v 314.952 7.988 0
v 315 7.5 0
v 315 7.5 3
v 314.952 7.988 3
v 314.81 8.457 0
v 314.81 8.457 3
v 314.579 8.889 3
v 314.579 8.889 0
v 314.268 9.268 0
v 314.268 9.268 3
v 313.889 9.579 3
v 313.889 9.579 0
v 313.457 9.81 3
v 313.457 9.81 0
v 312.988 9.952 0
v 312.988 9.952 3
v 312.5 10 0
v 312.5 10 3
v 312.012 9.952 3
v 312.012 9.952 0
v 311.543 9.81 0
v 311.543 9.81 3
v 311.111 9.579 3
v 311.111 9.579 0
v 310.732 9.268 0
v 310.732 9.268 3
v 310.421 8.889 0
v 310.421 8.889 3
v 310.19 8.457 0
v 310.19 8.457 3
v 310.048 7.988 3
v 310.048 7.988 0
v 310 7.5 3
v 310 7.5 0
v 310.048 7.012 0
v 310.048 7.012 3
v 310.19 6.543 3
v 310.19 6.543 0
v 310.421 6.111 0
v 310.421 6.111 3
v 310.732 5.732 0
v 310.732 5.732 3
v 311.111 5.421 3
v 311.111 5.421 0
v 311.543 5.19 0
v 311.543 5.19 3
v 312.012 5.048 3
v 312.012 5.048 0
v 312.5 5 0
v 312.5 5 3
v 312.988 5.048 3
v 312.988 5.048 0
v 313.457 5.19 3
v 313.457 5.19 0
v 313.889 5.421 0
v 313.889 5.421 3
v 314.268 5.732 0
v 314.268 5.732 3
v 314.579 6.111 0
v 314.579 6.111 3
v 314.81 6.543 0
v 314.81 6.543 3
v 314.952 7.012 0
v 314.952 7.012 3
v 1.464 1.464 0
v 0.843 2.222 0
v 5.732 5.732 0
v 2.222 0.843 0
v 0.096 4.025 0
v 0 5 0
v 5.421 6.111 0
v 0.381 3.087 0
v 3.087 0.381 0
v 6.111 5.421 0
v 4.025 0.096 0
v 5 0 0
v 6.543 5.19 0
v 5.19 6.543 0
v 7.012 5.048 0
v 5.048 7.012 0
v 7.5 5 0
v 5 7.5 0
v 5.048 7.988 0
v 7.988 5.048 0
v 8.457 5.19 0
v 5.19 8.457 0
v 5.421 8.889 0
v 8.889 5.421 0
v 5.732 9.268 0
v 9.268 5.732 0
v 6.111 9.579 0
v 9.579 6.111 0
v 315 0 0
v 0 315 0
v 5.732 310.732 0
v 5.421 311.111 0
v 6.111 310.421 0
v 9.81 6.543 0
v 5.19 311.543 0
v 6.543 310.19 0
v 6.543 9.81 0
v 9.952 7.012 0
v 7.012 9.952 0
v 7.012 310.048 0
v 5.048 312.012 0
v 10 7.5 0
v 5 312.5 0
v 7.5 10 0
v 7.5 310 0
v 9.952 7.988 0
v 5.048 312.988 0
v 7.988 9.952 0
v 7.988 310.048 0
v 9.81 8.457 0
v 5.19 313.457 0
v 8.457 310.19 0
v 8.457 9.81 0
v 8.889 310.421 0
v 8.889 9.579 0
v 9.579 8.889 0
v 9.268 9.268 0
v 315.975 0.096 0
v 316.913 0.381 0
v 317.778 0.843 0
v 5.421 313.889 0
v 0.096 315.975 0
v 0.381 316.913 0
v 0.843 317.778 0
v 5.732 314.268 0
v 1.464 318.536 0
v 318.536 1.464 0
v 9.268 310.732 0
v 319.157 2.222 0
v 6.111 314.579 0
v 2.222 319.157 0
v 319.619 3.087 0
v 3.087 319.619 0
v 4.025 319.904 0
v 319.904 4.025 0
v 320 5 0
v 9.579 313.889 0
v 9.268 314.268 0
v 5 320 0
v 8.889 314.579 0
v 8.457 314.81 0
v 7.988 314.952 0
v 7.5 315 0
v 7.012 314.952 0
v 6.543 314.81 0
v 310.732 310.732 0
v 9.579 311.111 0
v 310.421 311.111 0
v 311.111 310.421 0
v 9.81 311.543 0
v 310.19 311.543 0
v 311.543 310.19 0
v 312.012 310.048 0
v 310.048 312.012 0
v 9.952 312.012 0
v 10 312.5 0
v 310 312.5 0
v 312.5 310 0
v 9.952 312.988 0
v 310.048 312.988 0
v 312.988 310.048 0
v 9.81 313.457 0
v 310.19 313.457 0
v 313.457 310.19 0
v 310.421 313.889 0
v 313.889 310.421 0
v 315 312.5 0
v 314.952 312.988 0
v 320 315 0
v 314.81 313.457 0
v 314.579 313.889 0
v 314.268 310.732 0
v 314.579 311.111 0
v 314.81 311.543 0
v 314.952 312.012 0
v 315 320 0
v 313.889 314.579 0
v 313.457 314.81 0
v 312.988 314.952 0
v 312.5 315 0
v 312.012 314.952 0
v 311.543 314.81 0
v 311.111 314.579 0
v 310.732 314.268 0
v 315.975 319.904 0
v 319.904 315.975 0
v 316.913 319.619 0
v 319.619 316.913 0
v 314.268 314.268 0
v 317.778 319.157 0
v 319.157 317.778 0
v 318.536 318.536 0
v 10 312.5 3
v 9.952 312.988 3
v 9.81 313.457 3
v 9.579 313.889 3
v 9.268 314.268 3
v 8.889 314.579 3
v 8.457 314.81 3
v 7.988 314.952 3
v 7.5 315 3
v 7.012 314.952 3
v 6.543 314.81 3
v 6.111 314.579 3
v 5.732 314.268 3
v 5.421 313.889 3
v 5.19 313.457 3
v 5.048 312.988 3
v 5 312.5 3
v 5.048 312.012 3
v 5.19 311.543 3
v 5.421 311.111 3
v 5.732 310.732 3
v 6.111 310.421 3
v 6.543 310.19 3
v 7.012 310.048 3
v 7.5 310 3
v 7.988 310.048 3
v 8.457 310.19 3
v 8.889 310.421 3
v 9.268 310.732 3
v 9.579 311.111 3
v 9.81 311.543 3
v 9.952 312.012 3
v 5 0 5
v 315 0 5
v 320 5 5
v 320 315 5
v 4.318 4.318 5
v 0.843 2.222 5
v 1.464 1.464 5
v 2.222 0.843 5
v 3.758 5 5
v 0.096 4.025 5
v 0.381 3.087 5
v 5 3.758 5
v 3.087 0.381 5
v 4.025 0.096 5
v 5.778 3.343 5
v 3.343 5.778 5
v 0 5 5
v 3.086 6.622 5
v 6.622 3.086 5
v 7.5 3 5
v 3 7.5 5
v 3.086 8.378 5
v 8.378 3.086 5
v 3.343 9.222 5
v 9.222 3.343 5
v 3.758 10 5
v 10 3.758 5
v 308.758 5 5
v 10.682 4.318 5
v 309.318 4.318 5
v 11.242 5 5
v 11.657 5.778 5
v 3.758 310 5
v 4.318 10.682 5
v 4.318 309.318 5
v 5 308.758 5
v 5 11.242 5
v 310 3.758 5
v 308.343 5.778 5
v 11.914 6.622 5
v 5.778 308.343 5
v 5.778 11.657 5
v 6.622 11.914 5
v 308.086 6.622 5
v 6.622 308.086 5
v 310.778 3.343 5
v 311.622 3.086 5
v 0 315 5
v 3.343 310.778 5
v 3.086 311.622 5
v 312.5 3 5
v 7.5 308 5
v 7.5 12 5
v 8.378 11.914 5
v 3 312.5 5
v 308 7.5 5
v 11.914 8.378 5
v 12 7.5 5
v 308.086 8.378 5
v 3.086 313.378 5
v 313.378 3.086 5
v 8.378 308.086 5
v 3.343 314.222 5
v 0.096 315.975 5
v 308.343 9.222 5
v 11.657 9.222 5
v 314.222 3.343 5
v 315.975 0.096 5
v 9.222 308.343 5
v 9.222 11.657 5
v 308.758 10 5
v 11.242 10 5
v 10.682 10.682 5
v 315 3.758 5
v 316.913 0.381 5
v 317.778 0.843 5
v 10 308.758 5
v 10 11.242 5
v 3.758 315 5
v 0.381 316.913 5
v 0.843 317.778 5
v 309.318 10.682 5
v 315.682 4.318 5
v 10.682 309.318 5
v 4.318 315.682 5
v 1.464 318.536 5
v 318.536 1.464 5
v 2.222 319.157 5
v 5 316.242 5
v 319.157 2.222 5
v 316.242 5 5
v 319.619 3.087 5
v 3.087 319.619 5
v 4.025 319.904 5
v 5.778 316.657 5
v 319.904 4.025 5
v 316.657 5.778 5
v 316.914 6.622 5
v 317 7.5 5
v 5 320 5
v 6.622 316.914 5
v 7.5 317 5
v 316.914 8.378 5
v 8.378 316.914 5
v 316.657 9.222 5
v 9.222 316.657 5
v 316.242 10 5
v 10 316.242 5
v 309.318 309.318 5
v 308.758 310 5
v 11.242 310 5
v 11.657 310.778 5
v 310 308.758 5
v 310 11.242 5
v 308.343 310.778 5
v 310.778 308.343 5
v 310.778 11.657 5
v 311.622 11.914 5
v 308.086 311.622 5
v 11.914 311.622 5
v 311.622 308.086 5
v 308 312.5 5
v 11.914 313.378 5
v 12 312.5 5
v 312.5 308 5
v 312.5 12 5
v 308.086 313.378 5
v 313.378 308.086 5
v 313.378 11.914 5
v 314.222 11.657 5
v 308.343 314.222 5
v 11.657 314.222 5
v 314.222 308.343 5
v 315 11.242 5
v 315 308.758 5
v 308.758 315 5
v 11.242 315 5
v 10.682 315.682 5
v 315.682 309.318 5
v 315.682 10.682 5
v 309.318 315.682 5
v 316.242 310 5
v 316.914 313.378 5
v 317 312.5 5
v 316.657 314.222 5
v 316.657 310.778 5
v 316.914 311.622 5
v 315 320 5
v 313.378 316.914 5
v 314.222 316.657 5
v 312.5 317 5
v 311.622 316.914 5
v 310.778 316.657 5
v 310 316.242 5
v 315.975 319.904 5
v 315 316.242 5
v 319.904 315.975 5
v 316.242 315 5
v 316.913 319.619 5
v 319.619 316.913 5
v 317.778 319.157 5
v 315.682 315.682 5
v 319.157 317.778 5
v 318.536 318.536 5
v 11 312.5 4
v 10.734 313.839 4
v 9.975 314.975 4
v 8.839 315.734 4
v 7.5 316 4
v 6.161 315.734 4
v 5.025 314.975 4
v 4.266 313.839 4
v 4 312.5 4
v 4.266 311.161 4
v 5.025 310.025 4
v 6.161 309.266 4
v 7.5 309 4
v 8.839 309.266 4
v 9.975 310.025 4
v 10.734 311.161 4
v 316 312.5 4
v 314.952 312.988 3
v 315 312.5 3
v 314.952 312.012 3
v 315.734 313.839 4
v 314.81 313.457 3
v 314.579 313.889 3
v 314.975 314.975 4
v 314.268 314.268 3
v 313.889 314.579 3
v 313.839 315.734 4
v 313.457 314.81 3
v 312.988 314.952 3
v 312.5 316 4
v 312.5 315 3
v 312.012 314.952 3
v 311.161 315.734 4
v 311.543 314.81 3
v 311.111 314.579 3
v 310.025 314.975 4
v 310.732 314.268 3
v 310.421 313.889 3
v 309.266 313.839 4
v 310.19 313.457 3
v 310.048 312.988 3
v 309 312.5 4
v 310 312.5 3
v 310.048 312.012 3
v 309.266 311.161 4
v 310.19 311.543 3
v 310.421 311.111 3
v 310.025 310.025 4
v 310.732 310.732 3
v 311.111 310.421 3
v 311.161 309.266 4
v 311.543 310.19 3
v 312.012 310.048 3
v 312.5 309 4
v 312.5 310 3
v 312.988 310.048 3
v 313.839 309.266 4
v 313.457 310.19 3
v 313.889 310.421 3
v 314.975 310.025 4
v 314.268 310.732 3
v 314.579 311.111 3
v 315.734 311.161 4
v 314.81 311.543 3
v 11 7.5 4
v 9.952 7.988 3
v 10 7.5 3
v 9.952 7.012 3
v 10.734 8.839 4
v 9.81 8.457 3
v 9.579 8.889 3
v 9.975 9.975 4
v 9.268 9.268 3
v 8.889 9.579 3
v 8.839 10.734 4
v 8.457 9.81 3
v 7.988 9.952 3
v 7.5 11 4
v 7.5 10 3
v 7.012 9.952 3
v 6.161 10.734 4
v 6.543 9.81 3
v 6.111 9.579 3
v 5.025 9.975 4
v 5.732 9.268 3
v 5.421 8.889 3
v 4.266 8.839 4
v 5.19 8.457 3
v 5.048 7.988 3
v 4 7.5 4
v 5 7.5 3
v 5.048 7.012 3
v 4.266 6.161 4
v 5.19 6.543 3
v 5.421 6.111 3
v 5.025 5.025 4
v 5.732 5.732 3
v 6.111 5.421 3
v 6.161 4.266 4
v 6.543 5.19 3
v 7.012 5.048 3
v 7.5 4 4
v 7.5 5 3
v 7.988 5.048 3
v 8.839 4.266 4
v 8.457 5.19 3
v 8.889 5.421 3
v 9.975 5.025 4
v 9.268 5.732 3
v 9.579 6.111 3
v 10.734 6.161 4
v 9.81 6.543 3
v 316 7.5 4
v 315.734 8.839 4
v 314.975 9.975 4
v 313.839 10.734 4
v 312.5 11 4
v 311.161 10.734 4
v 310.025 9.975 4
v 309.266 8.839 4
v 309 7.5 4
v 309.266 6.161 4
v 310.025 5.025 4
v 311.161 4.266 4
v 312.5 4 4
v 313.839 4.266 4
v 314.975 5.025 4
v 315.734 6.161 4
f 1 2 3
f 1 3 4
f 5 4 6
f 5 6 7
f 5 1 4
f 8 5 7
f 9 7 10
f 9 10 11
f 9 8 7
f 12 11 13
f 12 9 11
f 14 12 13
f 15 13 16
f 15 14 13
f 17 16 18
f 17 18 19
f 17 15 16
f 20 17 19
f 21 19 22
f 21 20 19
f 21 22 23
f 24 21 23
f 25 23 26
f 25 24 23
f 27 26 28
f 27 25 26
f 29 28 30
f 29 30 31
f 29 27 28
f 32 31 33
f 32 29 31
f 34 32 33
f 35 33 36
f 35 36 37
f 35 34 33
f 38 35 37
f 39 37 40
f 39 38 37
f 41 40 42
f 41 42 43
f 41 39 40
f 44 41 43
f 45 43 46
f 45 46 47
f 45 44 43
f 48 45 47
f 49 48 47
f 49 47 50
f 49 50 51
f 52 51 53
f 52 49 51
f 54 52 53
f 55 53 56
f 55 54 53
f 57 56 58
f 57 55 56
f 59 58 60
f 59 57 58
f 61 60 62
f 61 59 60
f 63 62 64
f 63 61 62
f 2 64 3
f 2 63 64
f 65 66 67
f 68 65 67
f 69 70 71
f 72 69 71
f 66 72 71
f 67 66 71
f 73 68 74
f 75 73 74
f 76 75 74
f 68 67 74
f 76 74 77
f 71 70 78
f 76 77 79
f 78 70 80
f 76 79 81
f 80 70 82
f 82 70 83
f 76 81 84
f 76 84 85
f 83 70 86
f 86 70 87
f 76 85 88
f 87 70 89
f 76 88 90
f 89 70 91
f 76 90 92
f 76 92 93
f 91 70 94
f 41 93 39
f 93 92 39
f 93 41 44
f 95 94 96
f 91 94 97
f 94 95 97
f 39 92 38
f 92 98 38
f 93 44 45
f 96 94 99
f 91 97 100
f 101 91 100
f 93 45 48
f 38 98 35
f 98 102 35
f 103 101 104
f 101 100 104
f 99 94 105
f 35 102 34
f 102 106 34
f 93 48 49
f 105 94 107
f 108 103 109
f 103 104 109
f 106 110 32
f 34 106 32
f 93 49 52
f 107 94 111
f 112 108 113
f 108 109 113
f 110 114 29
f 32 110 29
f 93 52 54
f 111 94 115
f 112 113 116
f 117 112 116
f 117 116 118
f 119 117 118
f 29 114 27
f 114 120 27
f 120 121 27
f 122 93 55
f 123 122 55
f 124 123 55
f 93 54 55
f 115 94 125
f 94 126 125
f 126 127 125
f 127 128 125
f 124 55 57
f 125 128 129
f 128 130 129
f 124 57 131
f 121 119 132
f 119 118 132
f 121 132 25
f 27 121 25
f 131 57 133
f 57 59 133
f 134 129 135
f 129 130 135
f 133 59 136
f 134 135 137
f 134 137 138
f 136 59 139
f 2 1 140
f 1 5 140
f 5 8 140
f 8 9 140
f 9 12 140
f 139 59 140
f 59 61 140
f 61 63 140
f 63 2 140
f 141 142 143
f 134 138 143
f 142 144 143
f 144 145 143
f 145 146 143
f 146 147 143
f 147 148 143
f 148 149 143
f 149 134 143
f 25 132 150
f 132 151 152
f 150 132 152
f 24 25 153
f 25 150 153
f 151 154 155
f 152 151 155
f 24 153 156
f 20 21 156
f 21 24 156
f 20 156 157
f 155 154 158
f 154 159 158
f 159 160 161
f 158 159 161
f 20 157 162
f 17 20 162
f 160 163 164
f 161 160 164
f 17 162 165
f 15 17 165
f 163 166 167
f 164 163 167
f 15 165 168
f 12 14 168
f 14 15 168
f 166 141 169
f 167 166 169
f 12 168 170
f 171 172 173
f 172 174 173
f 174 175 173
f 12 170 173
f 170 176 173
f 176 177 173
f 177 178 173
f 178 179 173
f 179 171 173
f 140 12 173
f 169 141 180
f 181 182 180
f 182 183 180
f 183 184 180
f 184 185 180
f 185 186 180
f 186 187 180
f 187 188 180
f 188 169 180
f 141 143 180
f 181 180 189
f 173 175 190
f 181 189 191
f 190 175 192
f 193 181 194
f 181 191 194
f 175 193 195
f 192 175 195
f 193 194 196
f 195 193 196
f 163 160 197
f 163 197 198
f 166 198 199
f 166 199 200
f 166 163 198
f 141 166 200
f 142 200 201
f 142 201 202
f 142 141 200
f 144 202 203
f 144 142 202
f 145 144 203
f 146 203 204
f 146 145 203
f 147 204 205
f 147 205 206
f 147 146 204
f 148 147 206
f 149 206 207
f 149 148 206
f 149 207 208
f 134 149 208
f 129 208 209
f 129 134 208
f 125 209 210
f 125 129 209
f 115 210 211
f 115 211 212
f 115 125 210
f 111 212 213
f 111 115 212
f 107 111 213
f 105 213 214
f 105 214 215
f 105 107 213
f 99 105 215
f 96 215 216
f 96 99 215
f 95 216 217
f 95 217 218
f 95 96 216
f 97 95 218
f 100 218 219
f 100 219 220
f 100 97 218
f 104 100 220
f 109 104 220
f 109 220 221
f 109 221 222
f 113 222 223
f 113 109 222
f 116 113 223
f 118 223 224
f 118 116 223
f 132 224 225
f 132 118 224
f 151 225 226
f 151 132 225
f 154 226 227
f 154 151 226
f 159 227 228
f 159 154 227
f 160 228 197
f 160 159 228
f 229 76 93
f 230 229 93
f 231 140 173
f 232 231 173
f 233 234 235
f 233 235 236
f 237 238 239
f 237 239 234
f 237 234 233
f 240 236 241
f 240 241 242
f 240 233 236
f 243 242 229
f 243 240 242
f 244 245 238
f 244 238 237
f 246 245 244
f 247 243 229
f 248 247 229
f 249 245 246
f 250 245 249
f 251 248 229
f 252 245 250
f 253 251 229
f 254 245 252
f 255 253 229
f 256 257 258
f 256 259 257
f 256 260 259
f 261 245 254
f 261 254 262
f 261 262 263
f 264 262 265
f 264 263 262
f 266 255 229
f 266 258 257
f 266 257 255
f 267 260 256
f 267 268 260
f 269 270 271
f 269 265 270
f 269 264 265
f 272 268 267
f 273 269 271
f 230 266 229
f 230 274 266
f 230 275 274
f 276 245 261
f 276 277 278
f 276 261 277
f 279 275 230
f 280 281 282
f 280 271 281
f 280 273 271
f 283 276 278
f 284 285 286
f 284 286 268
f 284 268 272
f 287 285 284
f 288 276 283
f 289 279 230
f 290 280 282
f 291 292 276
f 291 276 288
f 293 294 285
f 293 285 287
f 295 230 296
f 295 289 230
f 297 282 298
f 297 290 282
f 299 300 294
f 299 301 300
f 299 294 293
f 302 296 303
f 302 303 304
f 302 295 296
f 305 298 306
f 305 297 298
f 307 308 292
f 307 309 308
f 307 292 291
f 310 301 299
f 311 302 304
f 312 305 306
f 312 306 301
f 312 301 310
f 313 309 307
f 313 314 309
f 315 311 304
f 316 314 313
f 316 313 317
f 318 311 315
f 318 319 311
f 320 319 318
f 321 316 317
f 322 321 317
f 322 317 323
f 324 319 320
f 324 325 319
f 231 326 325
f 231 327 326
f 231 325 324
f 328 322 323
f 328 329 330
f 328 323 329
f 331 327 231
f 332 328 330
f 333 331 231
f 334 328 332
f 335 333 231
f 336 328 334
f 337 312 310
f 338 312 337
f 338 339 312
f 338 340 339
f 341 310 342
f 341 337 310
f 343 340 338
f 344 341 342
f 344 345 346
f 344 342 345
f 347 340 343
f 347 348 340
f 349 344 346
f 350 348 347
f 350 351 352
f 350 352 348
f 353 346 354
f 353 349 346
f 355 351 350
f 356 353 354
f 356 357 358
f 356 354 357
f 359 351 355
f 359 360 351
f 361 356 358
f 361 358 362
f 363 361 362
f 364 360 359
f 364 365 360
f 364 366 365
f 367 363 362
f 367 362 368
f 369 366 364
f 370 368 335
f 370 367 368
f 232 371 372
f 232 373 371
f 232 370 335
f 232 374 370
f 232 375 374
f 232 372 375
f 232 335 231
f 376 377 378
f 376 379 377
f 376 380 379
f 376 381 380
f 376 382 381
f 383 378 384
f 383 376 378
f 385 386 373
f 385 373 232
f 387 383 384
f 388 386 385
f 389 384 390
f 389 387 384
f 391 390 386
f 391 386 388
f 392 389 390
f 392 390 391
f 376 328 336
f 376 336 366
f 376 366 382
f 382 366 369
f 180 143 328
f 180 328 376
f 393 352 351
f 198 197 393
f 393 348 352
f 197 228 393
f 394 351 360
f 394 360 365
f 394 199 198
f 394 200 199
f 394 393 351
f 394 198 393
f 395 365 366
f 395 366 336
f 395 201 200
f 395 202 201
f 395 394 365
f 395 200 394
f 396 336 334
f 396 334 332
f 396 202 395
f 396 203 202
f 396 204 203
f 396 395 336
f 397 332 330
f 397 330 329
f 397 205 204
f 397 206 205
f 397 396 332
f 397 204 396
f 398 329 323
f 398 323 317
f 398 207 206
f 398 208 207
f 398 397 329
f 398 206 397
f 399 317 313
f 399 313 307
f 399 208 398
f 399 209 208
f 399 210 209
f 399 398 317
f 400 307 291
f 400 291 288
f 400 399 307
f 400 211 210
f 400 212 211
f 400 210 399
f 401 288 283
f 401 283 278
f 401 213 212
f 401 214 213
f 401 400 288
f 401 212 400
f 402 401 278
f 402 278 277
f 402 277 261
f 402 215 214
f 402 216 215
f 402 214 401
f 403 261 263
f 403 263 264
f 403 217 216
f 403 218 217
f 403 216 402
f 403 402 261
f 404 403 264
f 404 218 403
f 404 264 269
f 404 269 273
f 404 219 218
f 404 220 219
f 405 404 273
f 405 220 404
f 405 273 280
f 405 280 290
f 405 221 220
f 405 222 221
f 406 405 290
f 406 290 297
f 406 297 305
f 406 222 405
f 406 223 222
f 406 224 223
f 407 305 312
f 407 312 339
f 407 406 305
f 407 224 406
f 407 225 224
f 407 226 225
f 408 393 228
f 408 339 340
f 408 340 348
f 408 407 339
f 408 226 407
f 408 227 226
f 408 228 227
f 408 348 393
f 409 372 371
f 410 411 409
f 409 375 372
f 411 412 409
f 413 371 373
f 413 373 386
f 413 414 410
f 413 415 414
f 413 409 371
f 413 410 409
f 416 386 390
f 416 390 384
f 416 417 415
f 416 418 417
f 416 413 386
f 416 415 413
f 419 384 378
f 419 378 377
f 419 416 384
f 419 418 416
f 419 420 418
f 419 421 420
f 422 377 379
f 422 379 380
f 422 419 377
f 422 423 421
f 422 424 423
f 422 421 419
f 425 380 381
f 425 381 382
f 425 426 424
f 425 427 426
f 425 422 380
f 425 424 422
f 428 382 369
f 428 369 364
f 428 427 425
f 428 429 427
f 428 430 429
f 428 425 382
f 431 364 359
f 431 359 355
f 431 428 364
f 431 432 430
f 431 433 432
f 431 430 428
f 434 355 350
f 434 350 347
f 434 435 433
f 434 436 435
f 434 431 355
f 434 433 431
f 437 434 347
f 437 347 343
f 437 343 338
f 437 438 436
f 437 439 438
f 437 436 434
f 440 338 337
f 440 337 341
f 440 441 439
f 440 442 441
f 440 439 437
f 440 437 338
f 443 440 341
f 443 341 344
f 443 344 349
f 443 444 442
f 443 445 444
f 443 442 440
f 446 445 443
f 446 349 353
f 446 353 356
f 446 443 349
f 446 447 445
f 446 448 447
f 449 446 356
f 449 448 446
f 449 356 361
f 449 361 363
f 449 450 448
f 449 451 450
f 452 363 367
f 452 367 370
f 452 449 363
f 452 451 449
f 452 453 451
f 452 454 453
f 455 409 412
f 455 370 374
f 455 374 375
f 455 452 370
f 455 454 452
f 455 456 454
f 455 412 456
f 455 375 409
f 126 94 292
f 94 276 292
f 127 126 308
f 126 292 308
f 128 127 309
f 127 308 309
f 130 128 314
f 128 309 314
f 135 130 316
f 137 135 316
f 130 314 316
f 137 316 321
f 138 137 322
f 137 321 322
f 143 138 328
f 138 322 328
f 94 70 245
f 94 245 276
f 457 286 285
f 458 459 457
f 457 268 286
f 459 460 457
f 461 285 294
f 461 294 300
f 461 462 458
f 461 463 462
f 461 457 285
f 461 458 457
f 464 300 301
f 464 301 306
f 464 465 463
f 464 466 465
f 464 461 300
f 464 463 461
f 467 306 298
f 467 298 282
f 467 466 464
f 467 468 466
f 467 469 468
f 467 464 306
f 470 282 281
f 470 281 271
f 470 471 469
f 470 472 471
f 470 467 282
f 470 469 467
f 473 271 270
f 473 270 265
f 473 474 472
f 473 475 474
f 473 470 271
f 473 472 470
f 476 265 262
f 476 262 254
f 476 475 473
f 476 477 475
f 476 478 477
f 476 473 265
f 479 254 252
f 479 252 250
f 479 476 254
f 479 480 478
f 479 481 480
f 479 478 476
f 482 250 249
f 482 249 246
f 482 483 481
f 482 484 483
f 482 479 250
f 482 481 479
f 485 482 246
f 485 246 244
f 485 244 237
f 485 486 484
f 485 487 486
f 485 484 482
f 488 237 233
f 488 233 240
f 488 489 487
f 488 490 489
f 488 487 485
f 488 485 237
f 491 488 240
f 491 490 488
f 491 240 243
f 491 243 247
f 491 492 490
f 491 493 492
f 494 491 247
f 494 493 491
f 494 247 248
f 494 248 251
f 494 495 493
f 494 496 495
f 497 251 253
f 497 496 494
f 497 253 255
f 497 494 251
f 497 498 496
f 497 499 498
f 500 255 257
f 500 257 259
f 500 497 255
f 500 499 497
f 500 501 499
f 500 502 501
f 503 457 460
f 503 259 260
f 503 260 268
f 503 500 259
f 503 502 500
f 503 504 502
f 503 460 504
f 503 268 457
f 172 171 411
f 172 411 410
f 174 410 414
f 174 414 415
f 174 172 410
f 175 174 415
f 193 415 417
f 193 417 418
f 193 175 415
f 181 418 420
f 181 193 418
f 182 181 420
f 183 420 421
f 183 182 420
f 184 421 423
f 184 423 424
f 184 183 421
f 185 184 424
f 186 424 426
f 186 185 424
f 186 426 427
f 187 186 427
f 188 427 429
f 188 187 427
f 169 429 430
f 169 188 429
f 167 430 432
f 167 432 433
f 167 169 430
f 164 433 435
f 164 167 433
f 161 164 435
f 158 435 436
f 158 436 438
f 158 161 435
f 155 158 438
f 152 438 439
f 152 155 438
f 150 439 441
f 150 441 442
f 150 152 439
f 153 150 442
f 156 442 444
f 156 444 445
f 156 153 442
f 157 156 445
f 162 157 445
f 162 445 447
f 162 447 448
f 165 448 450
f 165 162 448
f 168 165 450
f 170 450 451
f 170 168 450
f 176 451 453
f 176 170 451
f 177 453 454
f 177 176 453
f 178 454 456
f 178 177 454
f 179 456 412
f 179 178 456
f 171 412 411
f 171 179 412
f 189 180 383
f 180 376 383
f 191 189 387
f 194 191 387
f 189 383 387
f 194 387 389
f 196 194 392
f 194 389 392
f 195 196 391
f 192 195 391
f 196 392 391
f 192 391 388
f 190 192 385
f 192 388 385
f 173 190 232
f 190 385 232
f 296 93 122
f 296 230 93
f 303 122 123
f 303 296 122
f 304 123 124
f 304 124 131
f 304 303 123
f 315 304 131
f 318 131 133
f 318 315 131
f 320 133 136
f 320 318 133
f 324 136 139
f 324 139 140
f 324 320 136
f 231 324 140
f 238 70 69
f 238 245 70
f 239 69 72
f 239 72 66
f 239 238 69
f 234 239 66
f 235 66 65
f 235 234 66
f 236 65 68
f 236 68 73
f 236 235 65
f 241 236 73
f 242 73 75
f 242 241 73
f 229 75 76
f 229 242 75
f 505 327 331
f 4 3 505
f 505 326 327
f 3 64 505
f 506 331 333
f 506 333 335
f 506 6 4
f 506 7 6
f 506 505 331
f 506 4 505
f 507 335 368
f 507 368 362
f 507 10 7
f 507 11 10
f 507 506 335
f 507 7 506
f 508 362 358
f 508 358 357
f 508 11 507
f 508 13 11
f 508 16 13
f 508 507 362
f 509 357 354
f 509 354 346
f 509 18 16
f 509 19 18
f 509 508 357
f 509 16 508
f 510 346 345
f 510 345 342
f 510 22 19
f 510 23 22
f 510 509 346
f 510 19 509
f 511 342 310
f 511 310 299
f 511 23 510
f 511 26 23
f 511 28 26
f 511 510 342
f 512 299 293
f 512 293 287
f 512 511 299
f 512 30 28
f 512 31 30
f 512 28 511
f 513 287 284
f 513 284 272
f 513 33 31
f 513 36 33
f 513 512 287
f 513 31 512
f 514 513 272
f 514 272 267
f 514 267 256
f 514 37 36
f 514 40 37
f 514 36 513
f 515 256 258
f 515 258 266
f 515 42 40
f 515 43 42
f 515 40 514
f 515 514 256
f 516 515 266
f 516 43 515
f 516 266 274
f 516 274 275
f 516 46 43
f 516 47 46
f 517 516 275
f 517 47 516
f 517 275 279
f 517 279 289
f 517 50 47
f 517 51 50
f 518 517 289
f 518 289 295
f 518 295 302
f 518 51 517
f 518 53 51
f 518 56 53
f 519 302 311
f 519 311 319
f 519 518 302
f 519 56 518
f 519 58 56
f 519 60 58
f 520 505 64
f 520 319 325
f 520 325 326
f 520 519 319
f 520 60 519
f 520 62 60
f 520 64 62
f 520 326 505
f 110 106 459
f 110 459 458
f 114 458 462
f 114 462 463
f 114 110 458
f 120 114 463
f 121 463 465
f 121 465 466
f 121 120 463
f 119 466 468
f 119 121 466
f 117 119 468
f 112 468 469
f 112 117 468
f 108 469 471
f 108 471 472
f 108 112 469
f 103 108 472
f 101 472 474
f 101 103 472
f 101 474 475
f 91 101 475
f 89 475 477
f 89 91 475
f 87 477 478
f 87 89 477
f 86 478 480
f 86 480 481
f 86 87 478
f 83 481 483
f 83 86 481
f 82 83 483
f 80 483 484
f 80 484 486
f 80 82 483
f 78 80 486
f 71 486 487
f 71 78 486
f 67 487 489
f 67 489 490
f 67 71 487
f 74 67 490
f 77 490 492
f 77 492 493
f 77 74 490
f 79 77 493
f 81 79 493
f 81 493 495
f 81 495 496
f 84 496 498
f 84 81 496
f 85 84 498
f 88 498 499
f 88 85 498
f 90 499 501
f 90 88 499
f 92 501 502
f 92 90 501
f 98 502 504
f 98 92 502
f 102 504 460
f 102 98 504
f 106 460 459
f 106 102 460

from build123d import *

# Parameters (mm, degrees)
ESQUISSE1_W        = 320
ESQUISSE1_H        = 320
ESQUISSE1_R        = 2.5
BOSS_EXTRU_1_DEPTH = 5
CONG_1_R           = 5
CHANFREIN1_SIZE    = 2


with BuildPart() as part:
    # Esquisse1 → Boss.-Extru.1 (new body)
    with BuildSketch(Plane.XY):
        with Locations((160, 160)):
            Rectangle(ESQUISSE1_W, ESQUISSE1_H)
        with Locations((7.5, 312.5)):
            Circle(ESQUISSE1_R, mode=Mode.SUBTRACT)
        with Locations((312.5, 312.5)):
            Circle(ESQUISSE1_R, mode=Mode.SUBTRACT)
        with Locations((7.5, 7.5)):
            Circle(ESQUISSE1_R, mode=Mode.SUBTRACT)
        with Locations((312.5, 7.5)):
            Circle(ESQUISSE1_R, mode=Mode.SUBTRACT)
    extrude(amount=BOSS_EXTRU_1_DEPTH)

    # Congé1
    cong_1_edges = [part.edges().sort_by_distance(p)[0] for p in [
        (0, 0, 2.5),
        (0, 320, 2.5),
        (320, 320, 2.5),
        (320, 0, 2.5),
    ]]
    fillet(cong_1_edges, radius=CONG_1_R)

    # Chanfrein1
    chanfrein1_edges = [part.edges().sort_by_distance(p)[0] for p in [
        (310, 312.5, 5),
        (5, 312.5, 5),
        (5, 7.5, 5),
        (310, 7.5, 5),
    ]]
    chamfer(chanfrein1_edges, length=CHANFREIN1_SIZE)


solid = part.part
